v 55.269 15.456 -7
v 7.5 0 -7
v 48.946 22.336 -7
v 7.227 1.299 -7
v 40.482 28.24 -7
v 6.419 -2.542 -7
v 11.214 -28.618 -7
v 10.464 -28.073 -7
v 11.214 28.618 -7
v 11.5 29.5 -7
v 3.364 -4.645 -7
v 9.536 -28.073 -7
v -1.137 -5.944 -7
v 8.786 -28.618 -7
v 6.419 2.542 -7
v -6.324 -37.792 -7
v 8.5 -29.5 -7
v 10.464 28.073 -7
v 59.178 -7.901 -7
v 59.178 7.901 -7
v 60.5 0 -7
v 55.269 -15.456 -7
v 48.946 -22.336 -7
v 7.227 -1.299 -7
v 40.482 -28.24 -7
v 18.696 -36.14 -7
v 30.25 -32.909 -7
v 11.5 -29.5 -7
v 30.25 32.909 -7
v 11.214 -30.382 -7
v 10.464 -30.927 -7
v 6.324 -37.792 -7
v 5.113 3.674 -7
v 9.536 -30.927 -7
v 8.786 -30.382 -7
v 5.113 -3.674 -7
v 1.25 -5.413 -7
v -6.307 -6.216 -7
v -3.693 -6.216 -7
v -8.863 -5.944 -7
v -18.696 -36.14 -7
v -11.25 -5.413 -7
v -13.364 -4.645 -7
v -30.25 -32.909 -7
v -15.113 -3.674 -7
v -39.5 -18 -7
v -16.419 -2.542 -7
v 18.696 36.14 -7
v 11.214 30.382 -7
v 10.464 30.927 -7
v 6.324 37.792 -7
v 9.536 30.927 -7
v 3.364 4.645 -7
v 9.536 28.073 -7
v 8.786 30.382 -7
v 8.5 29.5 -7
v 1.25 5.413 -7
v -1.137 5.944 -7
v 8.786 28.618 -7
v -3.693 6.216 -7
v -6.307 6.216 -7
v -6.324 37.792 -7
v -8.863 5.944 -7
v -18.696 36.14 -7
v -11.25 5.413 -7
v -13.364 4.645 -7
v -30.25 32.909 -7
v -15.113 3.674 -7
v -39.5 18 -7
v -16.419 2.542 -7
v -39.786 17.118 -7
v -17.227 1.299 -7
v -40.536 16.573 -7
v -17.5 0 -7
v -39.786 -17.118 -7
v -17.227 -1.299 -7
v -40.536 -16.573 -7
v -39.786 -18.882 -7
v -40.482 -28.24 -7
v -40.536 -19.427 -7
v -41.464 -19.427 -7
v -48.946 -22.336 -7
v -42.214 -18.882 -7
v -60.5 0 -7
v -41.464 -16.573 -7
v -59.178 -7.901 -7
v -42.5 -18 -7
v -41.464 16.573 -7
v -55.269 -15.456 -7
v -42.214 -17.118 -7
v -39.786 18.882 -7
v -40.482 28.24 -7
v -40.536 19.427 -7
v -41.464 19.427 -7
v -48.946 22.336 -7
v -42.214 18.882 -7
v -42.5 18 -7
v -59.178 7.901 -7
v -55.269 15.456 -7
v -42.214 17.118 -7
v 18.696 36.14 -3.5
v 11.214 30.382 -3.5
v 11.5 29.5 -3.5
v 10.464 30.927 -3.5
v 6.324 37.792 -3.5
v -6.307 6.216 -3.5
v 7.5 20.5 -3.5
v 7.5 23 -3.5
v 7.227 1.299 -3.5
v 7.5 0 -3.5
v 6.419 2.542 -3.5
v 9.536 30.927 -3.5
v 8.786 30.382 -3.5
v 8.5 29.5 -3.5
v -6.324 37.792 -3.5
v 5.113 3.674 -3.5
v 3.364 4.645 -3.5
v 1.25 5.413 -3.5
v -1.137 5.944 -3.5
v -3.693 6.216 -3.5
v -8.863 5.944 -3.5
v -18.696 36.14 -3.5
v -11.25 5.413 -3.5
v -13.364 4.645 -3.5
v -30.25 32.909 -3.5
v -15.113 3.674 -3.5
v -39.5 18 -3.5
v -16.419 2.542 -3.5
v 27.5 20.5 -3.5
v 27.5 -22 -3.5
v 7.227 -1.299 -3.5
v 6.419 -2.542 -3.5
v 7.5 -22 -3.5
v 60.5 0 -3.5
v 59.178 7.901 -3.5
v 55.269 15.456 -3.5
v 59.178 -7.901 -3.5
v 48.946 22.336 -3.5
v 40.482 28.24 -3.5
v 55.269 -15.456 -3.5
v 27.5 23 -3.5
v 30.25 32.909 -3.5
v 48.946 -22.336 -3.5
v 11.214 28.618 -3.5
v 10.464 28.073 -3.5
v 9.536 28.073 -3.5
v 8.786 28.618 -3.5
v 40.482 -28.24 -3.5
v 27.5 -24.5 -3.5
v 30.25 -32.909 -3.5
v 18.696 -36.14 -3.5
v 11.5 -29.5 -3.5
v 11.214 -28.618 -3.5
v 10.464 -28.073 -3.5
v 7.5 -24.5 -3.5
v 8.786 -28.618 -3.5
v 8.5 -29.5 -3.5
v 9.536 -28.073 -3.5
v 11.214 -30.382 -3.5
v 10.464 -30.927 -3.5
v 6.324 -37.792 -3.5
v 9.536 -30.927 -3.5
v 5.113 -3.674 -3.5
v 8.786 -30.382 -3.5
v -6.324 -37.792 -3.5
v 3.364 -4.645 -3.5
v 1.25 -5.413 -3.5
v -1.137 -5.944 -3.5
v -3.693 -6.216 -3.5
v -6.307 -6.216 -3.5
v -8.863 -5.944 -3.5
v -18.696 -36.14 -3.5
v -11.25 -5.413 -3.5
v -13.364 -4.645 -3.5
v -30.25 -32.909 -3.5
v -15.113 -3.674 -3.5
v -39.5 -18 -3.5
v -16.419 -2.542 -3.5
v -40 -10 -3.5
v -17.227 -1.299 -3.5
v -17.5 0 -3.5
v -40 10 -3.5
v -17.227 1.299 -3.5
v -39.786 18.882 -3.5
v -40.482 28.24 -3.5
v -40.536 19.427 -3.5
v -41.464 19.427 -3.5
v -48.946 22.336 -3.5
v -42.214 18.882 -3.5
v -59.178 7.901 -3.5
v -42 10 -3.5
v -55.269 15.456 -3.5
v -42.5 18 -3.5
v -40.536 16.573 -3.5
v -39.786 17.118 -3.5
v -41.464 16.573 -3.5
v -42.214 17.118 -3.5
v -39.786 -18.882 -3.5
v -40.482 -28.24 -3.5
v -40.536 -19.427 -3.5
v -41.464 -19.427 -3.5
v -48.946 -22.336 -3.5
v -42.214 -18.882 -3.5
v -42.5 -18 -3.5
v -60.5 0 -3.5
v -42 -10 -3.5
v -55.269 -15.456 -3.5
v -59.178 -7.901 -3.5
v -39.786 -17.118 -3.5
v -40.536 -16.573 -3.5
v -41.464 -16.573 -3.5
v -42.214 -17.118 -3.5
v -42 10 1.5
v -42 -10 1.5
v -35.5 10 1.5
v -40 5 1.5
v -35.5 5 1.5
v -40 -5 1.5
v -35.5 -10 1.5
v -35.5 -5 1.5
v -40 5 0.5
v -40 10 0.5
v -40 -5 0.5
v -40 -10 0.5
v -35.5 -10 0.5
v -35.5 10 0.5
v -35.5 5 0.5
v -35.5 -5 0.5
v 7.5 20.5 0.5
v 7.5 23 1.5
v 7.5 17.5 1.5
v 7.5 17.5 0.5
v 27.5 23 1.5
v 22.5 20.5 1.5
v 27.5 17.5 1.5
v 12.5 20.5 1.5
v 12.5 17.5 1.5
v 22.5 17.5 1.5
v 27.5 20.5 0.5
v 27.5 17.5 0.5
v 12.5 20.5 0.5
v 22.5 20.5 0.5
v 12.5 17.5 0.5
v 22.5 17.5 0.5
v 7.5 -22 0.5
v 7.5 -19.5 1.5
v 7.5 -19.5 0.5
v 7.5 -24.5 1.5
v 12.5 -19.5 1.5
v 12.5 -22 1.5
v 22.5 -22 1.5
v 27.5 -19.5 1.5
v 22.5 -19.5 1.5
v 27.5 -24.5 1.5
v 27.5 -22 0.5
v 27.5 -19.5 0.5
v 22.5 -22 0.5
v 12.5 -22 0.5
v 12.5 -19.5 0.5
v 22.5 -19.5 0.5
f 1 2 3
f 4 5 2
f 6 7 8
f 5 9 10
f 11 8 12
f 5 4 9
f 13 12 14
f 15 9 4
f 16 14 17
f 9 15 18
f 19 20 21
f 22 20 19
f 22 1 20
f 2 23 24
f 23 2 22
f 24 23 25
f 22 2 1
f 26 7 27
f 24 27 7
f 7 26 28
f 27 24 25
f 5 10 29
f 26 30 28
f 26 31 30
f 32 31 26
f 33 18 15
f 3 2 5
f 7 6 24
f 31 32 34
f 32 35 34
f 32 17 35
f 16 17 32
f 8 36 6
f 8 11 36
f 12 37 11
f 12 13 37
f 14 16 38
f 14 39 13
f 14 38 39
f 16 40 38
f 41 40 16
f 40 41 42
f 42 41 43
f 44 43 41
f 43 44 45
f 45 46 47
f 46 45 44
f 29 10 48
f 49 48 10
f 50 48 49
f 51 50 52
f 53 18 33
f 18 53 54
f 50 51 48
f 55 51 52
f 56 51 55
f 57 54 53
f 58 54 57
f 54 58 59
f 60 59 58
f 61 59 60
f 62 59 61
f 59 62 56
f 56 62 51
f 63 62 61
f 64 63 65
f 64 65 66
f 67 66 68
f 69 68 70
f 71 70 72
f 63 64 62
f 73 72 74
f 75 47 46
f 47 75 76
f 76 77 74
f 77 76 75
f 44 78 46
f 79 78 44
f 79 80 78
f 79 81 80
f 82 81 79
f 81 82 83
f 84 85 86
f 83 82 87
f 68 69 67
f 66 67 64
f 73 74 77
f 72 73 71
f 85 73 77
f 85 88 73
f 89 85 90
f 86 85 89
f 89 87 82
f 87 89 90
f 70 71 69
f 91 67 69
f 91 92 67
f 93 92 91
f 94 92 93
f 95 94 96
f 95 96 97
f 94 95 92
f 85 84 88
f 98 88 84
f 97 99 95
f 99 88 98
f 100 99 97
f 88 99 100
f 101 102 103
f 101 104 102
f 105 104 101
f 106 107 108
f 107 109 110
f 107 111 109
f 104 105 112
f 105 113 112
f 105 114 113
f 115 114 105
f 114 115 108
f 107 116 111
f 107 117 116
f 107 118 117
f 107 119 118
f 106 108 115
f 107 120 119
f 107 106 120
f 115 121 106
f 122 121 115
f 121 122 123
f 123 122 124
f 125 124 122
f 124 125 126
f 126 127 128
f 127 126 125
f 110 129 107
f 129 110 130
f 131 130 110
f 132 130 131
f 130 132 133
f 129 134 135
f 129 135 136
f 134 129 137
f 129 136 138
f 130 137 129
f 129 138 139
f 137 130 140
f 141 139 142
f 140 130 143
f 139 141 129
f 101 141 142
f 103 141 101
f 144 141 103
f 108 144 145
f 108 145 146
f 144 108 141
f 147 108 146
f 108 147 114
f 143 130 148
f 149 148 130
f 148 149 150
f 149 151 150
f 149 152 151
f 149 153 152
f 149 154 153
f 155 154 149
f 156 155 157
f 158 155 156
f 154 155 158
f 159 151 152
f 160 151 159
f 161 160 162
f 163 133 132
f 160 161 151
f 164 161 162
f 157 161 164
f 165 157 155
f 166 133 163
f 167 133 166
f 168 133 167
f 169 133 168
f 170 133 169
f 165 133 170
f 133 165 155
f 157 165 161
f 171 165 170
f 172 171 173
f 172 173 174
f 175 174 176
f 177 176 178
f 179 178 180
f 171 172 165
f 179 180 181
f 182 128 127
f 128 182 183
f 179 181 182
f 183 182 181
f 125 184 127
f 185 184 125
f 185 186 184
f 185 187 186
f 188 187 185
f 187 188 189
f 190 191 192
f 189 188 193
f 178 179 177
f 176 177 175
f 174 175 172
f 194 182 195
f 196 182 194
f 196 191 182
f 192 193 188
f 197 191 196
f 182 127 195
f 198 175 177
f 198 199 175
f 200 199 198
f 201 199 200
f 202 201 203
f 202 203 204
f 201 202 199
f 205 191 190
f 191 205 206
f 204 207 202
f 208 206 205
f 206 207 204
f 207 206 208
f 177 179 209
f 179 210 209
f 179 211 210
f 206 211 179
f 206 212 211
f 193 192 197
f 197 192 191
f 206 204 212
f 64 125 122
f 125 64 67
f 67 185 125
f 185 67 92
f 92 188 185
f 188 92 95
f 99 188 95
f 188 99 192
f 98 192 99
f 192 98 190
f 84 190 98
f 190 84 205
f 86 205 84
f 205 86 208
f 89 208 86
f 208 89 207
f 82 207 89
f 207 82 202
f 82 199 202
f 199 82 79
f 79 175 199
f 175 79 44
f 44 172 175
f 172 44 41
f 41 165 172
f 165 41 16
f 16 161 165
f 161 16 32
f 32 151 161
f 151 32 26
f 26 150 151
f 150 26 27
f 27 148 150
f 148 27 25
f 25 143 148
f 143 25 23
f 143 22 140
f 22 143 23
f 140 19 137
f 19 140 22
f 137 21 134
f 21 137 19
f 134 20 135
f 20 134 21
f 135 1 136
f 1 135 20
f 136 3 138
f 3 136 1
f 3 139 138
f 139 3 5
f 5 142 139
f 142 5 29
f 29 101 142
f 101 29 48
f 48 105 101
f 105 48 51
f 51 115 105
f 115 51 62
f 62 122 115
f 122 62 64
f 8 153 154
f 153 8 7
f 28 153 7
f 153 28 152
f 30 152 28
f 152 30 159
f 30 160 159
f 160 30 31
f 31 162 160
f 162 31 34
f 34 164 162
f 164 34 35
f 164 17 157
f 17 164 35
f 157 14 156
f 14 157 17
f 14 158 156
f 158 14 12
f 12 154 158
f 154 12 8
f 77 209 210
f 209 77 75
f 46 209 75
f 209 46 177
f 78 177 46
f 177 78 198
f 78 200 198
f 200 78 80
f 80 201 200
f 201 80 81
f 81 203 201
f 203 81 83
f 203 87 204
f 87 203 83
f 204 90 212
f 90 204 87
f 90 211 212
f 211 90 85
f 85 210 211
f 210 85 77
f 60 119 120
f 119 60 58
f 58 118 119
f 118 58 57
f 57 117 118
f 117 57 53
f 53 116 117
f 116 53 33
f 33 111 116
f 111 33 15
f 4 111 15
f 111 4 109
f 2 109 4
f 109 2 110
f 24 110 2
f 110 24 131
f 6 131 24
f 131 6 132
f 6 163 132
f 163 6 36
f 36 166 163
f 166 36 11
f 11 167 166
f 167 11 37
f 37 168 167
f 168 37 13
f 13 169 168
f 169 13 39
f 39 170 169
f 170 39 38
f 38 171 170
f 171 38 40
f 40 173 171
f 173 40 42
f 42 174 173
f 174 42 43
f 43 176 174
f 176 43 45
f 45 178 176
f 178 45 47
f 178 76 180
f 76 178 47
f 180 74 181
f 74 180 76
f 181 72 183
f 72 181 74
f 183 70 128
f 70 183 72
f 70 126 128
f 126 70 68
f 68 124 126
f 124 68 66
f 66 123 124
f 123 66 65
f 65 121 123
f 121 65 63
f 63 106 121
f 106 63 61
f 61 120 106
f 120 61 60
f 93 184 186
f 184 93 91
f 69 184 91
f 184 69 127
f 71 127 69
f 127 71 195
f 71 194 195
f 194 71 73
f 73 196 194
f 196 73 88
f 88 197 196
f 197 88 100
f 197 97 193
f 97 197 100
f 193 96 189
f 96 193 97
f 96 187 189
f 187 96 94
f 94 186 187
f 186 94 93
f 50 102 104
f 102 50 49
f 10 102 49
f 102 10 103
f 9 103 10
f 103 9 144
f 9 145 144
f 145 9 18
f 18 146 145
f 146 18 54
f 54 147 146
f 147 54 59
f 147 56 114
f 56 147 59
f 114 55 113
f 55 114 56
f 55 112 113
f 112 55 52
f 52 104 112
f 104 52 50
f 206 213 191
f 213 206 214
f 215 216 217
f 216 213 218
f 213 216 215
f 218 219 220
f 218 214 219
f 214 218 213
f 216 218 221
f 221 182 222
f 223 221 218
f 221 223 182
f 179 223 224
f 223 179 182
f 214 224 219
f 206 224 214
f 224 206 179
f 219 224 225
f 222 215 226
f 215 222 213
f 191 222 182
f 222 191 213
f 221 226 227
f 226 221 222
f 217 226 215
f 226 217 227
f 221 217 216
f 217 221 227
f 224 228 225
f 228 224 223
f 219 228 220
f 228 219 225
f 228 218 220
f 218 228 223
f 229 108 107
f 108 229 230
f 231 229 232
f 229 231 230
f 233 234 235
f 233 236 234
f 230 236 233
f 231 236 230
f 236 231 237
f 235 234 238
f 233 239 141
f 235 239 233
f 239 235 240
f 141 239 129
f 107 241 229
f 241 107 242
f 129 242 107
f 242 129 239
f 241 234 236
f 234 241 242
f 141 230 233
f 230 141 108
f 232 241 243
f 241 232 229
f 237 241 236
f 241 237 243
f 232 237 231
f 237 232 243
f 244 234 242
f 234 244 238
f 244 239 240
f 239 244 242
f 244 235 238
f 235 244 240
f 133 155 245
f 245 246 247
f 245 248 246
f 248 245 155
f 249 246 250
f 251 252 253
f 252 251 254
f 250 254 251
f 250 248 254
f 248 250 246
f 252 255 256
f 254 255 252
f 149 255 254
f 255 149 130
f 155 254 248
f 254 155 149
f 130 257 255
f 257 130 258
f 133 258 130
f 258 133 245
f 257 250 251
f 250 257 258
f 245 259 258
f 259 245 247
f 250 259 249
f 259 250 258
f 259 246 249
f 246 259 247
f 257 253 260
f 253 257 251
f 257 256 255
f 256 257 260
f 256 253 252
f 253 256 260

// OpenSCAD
//fn = 100;

bottom_back_connector_position = 80;//[35:105]
bottom_left_connector_position = -46;//[-56:-26]
bottom_right_connector_position = 44;//[24:52]
bottom_length = 10.8;//[10.8,10.9,11,11.1,11.2,11.3,11.4,11.5]
bottom_width = 6.8;//[6.8,6.9,7,7.1,7.2]
bottom_height = 7;//[7,8,9]
bottom_hole_radius = 25;//[15:25]
bottom_hole_length = 1;//[0.7,0.8,0.9,1,1.1,1.2,1.3,1.4,1.5]
bottom_hole_width = 0.5;//[0.3,0.4,0.5,0.6,0.7,0.8]
screw_hole_size = 3;//[1,2,3,4]

module bottom()
{
//MAIN BOTTOM PART
linear_extrude(bottom_height)
difference()
{
scale([bottom_length+1.3,bottom_width+0.8,0])
circle(10);

//HOLE FOR SENSOR
scale([bottom_hole_length,bottom_hole_width,6])	
translate([10,0,0])
circle(bottom_hole_radius);

//FRONT SCREW HOLES
//LEFT
scale([1,1,15])
translate([-20,-59,0])
circle(screw_hole_size);
//RIGHT
scale([1,1,15])
translate([-20,59,0])
circle(screw_hole_size);

//BACK SCREW HOLES
//LEFT
scale(1,1,6)
translate([82,-36,0])
circle(screw_hole_size);
//RIGHT
scale(1,1,6)
translate([82,36,0])
circle(screw_hole_size);

//HOLE FOR LITTLE FINGER
scale([3,1,1])
translate([-12.5,bottom_width*18,0])
circle(7);
}

//BOTTOM SUPPORT

//BACK
//long
translate([bottom_back_connector_position,-20,7])
cube([4,40,10]);
//left
translate([bottom_back_connector_position-9,-20,15])
cube([10,10,2]);
//right
translate([bottom_back_connector_position-9,10,15])
cube([10,10,2]);

//LEFT
//long
translate([-55,bottom_left_connector_position,7])
cube([40,5,10]);
//right
translate([-25,bottom_left_connector_position+1 ,15])
cube([10,10,2]);
//left
translate([-55,bottom_left_connector_position+1,15])
cube([10,10,2]);

//RIGHT
//long
translate([-55,bottom_right_connector_position,7])
cube([40,5,10]);
//left
translate([-25,bottom_right_connector_position-5,15])
cube([10,10,2]);
//right
translate([-55,bottom_right_connector_position-5,15])
cube([10,10,2]);

}
//========================================//
scale(0.5)
{
rotate([0,0,180])
translate([0,0,-14])
bottom();
}
